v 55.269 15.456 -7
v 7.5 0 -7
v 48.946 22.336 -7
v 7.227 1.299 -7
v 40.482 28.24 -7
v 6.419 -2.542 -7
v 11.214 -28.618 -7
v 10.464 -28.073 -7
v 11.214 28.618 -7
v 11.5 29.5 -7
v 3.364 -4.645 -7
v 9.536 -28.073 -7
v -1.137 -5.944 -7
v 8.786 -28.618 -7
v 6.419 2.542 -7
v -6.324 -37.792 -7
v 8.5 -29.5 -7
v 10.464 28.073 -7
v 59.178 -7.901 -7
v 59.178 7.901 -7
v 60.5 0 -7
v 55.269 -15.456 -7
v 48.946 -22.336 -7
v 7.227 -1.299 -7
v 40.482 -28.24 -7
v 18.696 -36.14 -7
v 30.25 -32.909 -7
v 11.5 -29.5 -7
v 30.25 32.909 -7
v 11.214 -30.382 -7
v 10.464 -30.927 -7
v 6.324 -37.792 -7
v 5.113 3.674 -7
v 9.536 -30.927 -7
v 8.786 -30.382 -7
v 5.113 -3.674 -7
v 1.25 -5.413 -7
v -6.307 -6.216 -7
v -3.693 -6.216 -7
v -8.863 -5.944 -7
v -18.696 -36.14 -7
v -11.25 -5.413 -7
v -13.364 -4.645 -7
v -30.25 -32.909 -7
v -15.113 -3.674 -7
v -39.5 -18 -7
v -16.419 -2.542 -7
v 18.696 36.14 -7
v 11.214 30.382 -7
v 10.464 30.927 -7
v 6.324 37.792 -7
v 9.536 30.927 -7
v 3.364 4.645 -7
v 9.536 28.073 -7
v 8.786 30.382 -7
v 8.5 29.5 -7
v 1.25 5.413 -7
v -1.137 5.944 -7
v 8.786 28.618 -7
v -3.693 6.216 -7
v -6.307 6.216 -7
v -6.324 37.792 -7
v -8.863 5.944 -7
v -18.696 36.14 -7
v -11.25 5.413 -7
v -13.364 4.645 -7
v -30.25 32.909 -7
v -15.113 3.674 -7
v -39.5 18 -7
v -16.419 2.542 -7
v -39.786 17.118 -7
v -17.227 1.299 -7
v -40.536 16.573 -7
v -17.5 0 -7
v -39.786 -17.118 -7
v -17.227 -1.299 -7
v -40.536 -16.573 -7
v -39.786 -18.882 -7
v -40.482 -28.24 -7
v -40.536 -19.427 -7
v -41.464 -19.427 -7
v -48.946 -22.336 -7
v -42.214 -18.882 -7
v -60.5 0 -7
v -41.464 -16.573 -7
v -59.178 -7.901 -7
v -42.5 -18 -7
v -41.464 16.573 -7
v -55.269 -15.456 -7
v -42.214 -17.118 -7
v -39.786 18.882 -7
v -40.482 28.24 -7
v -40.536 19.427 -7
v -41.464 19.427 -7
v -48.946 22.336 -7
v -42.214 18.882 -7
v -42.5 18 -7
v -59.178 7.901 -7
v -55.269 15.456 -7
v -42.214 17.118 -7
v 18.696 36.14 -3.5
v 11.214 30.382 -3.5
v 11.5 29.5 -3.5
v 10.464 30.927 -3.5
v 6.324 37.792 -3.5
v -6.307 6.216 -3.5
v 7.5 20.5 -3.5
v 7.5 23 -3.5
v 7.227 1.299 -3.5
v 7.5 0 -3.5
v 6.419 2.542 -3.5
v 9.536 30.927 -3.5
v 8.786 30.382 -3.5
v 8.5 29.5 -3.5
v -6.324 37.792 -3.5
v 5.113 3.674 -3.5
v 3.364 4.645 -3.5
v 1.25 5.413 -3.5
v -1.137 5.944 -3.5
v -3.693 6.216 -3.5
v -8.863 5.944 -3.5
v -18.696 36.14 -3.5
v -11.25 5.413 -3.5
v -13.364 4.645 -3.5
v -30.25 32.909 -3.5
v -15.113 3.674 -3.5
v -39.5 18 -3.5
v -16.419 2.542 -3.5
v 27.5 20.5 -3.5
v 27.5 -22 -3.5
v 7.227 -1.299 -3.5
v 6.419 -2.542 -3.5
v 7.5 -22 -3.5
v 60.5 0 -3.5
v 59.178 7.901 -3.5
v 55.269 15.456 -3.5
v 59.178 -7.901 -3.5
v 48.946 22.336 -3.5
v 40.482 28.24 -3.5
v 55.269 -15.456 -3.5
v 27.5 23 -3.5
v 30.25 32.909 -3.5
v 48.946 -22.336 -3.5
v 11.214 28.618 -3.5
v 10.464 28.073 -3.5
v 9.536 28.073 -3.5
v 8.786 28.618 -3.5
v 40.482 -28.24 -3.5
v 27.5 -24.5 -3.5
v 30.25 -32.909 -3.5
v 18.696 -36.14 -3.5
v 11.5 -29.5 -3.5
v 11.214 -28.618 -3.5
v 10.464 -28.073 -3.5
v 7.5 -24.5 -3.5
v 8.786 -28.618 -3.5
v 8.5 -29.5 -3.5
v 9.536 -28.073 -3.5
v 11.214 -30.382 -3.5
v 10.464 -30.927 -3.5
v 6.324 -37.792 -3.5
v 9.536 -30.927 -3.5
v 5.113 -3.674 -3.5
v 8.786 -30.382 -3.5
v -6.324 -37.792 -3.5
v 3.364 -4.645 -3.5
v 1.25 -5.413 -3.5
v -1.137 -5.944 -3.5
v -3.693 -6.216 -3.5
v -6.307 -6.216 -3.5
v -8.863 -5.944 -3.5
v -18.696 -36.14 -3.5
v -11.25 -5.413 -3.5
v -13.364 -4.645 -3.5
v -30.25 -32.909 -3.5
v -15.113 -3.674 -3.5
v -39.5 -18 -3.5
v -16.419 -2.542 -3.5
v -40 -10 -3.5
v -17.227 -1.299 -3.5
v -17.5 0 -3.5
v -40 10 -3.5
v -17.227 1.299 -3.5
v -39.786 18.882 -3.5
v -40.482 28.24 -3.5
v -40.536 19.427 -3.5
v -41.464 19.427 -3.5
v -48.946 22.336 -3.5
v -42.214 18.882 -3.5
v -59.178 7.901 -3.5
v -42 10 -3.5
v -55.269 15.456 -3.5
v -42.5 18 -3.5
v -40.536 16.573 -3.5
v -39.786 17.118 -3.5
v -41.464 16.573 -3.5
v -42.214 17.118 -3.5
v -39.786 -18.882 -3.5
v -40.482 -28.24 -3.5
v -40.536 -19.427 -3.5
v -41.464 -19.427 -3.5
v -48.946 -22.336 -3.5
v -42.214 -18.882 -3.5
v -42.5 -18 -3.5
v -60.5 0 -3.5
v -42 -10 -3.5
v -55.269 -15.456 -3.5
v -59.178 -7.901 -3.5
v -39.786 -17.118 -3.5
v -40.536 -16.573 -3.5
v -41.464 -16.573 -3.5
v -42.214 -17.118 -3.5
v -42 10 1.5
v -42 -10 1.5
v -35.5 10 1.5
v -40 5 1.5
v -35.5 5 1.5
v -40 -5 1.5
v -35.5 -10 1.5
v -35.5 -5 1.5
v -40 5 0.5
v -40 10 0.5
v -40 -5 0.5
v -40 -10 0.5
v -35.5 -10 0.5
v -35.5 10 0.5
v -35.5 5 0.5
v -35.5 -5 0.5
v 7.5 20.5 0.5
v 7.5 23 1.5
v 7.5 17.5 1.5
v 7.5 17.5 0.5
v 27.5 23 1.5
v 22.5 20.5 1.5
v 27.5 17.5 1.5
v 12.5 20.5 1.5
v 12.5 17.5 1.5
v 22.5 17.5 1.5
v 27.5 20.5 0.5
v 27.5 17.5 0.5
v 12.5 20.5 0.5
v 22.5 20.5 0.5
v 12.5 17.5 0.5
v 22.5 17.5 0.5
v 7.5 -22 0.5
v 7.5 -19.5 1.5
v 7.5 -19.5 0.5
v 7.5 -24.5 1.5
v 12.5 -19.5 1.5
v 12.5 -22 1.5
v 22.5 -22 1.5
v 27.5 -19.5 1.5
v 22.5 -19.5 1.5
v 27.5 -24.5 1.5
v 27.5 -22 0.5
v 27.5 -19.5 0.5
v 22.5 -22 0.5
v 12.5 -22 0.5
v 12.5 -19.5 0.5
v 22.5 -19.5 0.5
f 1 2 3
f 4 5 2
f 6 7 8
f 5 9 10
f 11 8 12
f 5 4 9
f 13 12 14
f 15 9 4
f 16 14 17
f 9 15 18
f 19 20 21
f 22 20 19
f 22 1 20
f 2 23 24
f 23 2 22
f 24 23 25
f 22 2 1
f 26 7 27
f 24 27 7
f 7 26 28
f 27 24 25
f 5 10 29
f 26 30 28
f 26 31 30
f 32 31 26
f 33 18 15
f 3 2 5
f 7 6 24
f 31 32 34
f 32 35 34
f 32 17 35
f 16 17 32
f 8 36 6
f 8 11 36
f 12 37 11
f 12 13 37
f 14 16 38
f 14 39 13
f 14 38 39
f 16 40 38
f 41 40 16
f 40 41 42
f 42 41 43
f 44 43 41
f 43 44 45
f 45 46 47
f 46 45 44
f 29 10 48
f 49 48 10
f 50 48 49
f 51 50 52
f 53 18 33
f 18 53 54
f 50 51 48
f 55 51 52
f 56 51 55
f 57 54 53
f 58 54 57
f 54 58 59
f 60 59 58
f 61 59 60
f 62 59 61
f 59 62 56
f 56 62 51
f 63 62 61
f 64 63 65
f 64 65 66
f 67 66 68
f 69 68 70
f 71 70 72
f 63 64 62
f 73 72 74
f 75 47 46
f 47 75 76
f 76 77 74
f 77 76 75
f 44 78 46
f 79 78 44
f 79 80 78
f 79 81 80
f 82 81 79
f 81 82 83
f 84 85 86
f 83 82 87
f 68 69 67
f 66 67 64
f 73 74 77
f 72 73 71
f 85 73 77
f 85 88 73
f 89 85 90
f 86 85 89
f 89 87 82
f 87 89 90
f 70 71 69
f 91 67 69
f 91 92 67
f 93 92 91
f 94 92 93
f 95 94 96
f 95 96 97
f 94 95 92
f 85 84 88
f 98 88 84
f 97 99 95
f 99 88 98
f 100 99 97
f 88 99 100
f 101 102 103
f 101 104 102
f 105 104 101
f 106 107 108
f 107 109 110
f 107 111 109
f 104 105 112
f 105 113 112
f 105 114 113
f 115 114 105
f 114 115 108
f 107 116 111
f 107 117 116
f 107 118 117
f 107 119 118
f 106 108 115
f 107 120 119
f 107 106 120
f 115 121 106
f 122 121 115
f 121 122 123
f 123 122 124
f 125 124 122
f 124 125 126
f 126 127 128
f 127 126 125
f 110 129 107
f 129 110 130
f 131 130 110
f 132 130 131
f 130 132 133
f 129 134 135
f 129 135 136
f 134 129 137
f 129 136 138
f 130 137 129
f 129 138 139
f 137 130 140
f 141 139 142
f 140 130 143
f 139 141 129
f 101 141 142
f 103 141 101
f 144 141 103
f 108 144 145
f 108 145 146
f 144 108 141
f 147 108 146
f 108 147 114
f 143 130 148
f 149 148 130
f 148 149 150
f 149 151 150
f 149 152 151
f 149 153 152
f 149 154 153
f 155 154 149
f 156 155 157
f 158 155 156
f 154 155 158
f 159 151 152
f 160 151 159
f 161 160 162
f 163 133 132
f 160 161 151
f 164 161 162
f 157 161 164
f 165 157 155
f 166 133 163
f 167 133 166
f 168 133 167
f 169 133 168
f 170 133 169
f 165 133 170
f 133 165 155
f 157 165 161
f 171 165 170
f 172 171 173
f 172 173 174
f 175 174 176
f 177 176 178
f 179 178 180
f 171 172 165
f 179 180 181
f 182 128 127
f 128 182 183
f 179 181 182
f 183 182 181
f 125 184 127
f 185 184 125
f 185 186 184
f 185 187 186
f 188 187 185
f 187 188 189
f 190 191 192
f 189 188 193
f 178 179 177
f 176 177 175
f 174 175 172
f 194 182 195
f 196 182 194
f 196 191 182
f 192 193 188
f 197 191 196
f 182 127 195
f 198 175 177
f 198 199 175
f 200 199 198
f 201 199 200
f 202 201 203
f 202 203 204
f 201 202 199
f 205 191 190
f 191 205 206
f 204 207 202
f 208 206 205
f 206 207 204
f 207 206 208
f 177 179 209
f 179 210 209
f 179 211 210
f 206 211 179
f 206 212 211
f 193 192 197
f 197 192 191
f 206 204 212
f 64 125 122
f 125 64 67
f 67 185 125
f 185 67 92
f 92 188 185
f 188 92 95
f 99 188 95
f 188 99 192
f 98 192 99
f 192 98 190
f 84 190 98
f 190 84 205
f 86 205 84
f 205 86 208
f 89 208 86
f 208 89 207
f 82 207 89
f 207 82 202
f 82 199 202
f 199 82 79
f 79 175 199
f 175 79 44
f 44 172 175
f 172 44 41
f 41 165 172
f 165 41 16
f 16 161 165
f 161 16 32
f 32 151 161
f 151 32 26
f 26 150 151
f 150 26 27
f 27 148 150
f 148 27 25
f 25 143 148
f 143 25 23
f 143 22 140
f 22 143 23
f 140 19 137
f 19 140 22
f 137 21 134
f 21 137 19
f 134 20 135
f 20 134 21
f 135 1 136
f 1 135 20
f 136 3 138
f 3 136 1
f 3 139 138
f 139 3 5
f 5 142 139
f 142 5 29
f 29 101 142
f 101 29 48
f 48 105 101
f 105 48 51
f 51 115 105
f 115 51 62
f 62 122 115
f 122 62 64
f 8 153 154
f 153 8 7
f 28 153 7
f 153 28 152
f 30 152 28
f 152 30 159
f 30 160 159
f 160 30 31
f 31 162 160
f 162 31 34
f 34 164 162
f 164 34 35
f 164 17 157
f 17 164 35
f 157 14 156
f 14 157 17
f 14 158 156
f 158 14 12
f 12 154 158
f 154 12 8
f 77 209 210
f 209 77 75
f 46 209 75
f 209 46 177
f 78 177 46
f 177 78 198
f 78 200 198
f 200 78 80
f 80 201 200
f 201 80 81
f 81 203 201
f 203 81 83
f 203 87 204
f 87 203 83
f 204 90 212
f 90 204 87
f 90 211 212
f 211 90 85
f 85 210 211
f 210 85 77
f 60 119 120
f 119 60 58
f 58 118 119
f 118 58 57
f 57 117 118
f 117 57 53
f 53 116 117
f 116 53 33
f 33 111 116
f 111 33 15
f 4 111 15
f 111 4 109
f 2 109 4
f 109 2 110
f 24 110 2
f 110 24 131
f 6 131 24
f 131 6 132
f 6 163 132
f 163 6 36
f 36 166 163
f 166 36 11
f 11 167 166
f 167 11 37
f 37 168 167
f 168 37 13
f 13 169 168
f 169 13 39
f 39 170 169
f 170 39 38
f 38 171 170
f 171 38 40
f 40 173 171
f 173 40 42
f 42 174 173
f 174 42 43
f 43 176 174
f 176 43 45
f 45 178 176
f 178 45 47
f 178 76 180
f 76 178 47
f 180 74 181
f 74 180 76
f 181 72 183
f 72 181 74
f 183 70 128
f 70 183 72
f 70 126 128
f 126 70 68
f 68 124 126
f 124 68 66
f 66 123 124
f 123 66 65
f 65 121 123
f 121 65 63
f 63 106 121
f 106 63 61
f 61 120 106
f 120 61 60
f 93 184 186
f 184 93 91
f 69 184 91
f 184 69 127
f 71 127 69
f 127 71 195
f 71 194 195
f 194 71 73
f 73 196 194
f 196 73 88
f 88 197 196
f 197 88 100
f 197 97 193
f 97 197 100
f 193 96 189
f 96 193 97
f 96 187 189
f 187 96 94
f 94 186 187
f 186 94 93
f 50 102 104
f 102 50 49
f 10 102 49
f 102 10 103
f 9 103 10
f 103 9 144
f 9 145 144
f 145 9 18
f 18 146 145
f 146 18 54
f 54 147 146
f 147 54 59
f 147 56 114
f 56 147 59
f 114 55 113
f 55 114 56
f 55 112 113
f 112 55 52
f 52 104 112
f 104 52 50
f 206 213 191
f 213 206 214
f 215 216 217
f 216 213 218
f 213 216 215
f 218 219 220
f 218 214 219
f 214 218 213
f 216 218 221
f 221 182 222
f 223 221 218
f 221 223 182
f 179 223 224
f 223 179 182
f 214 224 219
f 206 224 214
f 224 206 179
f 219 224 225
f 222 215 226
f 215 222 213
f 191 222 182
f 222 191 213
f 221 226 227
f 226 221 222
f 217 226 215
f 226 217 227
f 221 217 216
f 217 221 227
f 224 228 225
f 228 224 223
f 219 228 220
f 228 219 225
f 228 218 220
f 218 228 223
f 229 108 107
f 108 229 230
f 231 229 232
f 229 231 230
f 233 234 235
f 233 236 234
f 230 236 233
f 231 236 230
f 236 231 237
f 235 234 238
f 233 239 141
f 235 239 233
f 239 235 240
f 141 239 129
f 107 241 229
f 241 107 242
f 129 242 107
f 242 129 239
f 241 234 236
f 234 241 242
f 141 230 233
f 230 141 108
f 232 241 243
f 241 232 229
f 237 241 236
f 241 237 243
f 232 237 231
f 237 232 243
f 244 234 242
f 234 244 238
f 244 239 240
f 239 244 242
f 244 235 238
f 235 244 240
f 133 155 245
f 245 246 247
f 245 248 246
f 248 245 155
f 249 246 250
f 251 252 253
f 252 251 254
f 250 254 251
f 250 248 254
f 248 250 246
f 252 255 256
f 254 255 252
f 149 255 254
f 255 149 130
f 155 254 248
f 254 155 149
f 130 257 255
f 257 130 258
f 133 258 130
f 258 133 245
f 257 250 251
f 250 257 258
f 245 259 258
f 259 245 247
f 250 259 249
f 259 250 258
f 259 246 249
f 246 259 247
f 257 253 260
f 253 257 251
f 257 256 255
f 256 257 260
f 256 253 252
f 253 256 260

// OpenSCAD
//fn = 100;

bottom_back_connector_position = 80;//[35:105]
bottom_left_connector_position = -46;//[-56:-26]
bottom_right_connector_position = 44;//[24:52]
bottom_length = 10.8;//[10.8,10.9,11,11.1,11.2,11.3,11.4,11.5]
bottom_width = 6.8;//[6.8,6.9,7,7.1,7.2]
bottom_height = 7;//[7,8,9]
bottom_hole_radius = 25;//[15:25]
bottom_hole_length = 1;//[0.7,0.8,0.9,1,1.1,1.2,1.3,1.4,1.5]
bottom_hole_width = 0.5;//[0.3,0.4,0.5,0.6,0.7,0.8]
screw_hole_size = 3;//[1,2,3,4]

module bottom()
{
//MAIN BOTTOM PART
linear_extrude(bottom_height)
difference()
{
scale([bottom_length+1.3,bottom_width+0.8,0])
circle(10);

//HOLE FOR SENSOR
scale([bottom_hole_length,bottom_hole_width,6])	
translate([10,0,0])
circle(bottom_hole_radius);

//FRONT SCREW HOLES
//LEFT
scale([1,1,15])
translate([-20,-59,0])
circle(screw_hole_size);
//RIGHT
scale([1,1,15])
translate([-20,59,0])
circle(screw_hole_size);

//BACK SCREW HOLES
//LEFT
scale(1,1,6)
translate([82,-36,0])
circle(screw_hole_size);
//RIGHT
scale(1,1,6)
translate([82,36,0])
circle(screw_hole_size);

//HOLE FOR LITTLE FINGER
scale([3,1,1])
translate([-12.5,bottom_width*18,0])
circle(7);
}

//BOTTOM SUPPORT

//BACK
//long
translate([bottom_back_connector_position,-20,7])
cube([4,40,10]);
//left
translate([bottom_back_connector_position-9,-20,15])
cube([10,10,2]);
//right
translate([bottom_back_connector_position-9,10,15])
cube([10,10,2]);

//LEFT
//long
translate([-55,bottom_left_connector_position,7])
cube([40,5,10]);
//right
translate([-25,bottom_left_connector_position+1 ,15])
cube([10,10,2]);
//left
translate([-55,bottom_left_connector_position+1,15])
cube([10,10,2]);

//RIGHT
//long
translate([-55,bottom_right_connector_position,7])
cube([40,5,10]);
//left
translate([-25,bottom_right_connector_position-5,15])
cube([10,10,2]);
//right
translate([-55,bottom_right_connector_position-5,15])
cube([10,10,2]);

}
//========================================//
scale(0.5)
{
rotate([0,0,180])
translate([0,0,-14])
bottom();
}
